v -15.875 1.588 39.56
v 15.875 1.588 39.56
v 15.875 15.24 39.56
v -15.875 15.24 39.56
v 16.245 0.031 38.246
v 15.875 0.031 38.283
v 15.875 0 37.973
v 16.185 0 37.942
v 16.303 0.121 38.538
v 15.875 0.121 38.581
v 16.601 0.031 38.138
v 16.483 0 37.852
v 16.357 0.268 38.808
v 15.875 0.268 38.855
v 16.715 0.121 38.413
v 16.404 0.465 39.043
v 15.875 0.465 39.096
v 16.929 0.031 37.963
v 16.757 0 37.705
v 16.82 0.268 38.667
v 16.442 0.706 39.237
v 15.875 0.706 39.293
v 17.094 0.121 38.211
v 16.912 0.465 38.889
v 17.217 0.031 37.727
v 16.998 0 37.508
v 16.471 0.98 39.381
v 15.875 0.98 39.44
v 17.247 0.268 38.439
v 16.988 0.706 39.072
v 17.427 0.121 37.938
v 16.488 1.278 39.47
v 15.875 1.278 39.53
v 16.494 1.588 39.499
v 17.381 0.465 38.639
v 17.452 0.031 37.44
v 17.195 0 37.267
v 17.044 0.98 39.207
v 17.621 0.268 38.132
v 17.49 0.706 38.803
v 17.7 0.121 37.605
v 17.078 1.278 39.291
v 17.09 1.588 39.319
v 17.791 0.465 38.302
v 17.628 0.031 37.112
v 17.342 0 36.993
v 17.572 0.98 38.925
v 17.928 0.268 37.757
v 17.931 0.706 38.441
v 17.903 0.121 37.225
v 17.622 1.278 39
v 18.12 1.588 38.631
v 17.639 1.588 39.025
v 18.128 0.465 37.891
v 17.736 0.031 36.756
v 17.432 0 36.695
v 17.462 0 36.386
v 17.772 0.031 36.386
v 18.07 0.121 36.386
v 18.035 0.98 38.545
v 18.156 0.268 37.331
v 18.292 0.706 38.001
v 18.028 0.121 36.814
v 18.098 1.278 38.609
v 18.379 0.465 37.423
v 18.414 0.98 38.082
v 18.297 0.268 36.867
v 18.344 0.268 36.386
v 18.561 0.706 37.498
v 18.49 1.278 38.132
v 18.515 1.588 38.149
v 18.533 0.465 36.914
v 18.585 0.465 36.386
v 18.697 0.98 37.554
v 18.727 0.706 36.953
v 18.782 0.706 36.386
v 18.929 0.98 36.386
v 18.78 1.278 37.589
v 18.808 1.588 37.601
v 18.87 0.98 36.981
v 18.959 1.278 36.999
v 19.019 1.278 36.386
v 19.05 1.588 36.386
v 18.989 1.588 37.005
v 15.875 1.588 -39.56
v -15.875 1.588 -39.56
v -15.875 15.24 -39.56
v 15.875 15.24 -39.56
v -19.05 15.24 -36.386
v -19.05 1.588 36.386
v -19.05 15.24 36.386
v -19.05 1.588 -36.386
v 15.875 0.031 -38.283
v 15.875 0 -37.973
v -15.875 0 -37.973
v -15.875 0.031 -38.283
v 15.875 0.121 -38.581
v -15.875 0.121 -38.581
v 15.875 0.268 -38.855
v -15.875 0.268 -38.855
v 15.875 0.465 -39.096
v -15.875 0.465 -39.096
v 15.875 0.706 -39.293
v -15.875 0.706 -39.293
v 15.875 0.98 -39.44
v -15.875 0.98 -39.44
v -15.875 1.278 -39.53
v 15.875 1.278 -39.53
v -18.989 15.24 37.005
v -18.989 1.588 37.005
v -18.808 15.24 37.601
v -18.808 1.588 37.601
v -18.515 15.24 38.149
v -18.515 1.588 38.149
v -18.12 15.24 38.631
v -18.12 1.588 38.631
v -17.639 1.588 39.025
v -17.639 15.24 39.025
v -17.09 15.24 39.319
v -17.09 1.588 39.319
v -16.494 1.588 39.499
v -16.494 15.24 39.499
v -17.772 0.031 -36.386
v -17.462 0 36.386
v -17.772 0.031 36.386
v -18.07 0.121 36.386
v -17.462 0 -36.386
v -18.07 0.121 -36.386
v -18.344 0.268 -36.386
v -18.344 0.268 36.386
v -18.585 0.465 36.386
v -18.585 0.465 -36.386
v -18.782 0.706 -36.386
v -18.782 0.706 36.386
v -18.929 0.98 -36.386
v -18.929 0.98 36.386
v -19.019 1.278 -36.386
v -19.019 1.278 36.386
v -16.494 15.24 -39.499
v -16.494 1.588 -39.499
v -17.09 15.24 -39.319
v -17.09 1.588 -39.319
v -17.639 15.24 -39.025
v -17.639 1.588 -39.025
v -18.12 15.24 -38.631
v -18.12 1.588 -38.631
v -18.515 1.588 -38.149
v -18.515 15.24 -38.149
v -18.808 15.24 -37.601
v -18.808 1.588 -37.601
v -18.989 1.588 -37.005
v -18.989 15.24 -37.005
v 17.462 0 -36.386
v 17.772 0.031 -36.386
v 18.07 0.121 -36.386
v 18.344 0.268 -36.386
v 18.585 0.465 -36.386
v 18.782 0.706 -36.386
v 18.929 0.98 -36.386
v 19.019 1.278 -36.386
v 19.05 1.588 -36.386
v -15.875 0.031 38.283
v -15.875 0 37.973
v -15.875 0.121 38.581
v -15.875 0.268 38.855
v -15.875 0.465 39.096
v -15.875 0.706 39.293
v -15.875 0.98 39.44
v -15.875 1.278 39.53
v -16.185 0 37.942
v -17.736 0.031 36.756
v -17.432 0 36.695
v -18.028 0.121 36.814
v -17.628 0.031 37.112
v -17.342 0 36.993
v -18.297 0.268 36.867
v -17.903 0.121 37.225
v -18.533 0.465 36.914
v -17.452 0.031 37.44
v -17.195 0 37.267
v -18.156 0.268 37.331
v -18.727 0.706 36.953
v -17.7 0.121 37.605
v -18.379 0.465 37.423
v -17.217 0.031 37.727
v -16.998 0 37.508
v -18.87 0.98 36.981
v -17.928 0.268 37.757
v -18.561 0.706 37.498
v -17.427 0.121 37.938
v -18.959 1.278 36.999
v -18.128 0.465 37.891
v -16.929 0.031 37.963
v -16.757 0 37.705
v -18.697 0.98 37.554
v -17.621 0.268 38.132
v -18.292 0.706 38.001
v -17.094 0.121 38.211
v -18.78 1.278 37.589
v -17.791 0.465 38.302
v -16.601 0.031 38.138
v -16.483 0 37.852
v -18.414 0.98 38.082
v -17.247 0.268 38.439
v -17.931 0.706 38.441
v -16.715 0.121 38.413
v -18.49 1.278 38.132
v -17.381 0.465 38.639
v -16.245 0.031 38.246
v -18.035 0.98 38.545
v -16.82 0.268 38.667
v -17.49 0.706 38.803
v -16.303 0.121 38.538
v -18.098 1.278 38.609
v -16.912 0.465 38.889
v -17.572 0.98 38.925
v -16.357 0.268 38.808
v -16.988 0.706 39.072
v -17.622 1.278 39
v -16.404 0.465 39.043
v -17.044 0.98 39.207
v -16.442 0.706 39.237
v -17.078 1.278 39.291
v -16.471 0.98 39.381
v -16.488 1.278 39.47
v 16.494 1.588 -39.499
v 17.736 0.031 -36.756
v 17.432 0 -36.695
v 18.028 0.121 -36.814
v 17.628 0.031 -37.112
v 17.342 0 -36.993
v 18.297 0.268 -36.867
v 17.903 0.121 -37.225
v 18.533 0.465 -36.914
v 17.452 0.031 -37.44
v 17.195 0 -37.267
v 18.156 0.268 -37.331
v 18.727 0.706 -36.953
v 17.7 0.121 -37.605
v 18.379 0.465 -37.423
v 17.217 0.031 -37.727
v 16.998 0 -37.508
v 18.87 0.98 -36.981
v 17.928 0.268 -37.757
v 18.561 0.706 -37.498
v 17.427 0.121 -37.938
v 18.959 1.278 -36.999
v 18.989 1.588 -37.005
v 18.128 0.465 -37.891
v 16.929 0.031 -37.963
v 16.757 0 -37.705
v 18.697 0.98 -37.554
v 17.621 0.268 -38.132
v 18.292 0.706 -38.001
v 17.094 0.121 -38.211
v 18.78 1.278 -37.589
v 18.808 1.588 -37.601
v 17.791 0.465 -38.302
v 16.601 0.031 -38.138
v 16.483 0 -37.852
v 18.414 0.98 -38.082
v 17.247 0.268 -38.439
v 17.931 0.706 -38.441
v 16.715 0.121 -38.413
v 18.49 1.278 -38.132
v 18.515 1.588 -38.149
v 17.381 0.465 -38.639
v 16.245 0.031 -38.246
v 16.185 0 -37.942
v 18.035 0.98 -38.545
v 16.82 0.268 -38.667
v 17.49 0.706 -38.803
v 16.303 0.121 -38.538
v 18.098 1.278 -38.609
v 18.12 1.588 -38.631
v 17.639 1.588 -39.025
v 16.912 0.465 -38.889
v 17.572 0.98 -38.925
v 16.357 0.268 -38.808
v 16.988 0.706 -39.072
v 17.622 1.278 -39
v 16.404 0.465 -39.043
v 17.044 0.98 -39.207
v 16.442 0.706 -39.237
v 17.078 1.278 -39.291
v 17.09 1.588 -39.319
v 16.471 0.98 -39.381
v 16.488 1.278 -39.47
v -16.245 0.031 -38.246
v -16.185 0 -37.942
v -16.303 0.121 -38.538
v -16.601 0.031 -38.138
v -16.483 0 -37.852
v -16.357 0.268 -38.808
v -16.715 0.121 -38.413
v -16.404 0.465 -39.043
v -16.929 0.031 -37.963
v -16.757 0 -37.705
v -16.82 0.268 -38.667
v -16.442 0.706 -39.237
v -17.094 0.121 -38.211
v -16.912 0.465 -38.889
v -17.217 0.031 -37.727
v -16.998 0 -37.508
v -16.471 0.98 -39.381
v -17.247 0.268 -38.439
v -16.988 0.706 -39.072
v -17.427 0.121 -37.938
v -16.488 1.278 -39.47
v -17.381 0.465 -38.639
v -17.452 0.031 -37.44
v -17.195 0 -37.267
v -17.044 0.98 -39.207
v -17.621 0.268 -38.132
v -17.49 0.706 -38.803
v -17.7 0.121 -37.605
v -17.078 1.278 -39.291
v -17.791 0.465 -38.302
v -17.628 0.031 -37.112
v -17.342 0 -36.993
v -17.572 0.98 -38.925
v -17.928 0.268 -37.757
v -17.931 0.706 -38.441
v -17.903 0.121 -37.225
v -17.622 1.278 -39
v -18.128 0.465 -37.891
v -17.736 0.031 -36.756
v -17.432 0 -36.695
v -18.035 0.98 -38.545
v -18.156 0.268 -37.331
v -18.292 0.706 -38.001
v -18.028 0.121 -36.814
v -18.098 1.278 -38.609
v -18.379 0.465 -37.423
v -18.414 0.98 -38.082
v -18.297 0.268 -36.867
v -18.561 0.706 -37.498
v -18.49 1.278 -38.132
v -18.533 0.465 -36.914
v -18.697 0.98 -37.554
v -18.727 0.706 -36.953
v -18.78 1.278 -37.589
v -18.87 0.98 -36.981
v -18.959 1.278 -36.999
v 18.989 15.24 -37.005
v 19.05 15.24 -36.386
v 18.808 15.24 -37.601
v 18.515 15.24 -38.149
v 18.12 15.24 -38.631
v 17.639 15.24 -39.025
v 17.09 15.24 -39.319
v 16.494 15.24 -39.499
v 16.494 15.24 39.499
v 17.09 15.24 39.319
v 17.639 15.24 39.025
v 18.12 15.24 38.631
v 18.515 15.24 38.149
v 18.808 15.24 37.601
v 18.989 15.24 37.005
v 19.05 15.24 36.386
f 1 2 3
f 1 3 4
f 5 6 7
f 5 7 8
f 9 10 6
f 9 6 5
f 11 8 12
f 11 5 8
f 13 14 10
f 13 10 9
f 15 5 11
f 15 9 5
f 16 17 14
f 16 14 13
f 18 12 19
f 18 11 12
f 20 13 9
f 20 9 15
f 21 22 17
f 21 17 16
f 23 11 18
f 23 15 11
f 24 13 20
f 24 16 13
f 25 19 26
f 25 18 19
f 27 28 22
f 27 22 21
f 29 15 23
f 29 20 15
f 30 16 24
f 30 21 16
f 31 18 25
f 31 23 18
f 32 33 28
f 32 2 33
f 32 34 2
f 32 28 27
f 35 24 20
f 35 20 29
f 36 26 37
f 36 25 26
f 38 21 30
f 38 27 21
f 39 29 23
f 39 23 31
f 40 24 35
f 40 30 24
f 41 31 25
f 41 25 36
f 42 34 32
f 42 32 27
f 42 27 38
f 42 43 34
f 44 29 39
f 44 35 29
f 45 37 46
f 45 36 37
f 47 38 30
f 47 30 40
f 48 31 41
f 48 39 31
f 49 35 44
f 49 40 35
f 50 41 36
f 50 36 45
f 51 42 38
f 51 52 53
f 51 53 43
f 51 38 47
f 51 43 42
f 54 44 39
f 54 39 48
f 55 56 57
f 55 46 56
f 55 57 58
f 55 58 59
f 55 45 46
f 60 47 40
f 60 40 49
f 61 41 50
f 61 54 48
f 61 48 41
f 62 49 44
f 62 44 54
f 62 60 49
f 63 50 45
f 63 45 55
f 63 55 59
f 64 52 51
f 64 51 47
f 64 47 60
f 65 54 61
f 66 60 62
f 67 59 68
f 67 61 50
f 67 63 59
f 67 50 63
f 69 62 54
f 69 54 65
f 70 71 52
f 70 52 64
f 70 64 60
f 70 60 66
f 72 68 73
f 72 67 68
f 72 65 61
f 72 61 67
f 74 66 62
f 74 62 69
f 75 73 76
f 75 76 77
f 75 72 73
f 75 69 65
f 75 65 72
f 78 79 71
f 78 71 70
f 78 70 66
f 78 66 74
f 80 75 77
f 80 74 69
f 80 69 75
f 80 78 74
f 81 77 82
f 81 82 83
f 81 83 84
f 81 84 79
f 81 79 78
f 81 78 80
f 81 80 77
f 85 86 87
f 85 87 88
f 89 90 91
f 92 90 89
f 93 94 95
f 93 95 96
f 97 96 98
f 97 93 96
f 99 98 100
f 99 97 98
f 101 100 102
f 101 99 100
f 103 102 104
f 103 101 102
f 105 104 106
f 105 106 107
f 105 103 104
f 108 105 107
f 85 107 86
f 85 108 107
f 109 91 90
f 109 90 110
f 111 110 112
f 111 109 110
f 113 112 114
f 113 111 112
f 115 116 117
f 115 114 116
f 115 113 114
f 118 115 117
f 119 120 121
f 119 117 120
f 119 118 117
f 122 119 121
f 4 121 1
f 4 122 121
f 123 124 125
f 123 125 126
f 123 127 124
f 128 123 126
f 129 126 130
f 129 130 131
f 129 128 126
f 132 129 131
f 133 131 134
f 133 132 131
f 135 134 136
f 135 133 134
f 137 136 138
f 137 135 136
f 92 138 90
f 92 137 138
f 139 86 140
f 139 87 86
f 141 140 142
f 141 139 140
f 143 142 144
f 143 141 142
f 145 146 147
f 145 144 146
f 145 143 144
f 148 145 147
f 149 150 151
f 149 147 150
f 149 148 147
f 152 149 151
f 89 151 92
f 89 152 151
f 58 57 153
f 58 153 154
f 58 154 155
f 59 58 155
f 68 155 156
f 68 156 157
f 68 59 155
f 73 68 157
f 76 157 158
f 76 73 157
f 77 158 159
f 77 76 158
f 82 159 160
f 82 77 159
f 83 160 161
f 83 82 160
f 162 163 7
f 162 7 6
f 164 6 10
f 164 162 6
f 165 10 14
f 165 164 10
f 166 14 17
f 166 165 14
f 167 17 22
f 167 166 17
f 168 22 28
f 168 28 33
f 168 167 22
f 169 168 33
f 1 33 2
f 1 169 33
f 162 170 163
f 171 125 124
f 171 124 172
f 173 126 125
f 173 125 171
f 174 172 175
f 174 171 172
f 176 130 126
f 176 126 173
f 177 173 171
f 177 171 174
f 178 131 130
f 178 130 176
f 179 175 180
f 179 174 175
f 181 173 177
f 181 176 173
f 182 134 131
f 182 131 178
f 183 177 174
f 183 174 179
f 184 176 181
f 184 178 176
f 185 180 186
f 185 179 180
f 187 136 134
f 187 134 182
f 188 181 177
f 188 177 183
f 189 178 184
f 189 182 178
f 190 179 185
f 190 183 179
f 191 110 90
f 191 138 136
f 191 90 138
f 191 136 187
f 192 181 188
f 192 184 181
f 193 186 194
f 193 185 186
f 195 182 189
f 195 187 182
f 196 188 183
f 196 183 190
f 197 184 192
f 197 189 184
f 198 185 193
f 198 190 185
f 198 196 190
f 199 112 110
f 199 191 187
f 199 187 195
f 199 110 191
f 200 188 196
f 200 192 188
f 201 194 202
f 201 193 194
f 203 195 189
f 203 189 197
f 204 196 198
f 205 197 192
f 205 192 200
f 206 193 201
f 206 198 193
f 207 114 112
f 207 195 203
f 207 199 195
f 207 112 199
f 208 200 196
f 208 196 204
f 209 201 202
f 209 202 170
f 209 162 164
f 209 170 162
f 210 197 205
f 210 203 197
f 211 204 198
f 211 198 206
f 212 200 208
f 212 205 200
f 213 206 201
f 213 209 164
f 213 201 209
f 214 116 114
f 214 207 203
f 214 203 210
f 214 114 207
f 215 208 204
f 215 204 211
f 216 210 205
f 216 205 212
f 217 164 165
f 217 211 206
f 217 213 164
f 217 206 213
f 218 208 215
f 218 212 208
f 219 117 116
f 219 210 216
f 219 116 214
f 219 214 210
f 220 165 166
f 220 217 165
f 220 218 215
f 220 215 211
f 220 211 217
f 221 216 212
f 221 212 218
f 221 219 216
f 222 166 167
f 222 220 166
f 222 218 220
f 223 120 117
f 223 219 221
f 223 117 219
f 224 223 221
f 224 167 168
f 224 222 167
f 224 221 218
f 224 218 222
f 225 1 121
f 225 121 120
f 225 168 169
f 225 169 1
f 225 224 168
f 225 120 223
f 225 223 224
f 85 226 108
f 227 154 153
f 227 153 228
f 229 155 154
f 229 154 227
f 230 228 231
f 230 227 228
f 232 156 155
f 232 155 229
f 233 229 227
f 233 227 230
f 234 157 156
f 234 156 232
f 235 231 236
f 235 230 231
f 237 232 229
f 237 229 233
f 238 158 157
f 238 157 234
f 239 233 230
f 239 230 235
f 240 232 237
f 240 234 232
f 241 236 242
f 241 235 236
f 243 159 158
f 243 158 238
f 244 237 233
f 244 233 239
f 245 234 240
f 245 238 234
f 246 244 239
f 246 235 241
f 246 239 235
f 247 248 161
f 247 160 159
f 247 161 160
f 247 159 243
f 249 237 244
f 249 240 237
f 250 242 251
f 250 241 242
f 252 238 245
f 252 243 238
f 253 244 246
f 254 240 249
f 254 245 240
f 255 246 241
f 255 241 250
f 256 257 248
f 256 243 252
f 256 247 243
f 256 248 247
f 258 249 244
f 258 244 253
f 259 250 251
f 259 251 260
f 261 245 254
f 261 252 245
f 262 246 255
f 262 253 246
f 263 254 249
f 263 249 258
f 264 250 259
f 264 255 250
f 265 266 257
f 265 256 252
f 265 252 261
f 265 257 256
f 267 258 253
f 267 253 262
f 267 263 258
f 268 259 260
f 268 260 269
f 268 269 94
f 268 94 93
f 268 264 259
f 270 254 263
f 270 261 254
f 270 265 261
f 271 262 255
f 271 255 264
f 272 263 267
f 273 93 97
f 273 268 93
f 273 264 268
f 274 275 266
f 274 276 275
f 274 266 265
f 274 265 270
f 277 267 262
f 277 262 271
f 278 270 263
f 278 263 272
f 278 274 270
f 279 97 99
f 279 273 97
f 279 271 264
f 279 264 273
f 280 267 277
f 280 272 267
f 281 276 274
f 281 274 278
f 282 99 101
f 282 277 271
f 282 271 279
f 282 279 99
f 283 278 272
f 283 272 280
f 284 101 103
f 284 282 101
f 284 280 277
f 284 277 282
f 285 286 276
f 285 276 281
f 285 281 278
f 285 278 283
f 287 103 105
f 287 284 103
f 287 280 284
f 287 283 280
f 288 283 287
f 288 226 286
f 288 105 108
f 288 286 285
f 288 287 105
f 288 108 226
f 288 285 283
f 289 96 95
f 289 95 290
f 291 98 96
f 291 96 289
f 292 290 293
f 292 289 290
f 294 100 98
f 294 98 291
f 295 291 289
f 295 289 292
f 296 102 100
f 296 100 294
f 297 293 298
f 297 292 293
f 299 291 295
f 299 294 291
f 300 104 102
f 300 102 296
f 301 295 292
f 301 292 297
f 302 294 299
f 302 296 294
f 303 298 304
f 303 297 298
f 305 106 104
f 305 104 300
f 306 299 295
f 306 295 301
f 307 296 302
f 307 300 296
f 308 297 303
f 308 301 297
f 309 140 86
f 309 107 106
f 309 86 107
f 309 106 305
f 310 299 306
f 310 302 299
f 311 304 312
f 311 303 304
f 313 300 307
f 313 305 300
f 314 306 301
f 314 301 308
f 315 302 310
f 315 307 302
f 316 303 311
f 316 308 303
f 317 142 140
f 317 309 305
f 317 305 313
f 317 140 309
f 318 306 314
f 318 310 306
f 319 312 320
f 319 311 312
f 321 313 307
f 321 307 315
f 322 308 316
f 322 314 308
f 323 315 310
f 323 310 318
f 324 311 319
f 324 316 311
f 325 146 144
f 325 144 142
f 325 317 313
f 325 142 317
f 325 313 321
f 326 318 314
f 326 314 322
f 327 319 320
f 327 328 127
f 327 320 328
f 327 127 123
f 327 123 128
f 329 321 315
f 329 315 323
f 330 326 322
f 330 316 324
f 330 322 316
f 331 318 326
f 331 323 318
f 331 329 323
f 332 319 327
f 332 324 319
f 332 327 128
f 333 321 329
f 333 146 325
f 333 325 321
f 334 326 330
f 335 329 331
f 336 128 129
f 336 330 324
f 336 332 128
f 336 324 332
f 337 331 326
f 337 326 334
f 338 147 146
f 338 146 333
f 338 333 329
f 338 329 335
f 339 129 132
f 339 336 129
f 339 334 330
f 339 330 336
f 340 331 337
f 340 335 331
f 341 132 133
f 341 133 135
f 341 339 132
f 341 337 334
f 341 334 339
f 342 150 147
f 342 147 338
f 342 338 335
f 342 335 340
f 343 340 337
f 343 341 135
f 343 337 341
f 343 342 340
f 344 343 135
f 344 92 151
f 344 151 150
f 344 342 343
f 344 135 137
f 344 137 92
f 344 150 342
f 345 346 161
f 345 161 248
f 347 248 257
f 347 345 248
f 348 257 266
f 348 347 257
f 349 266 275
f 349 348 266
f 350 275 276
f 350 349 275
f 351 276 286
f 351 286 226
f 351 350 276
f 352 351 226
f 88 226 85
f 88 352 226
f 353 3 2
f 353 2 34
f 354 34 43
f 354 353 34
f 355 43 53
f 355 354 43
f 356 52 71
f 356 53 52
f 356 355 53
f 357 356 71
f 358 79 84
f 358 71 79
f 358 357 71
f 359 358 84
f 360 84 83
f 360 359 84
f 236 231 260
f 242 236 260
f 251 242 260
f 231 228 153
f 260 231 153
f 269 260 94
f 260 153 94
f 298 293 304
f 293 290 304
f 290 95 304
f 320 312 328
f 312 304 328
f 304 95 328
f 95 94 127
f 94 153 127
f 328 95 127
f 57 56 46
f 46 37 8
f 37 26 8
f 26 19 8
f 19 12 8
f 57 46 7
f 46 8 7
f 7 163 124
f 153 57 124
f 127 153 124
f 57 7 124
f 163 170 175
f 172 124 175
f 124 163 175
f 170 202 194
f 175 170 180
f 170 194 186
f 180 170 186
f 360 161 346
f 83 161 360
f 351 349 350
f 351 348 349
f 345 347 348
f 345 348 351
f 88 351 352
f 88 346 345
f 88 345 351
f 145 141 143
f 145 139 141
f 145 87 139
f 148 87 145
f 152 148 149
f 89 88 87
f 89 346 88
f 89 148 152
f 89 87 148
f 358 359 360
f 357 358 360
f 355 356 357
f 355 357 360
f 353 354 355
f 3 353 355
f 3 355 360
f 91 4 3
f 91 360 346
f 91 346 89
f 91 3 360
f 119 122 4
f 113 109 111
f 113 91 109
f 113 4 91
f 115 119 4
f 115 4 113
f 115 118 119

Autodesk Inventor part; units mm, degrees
ref_plane "YZ Plane" through (0, 0, 0) normal (1, 0, 0) x (0, 1, 0)
ref_plane "XZ Plane" through (0, 0, 0) normal (0, 1, 0) x (-1, 0, 0)
ref_plane "XY Plane" through (0, 0, 0) normal (0, 0, 1) x (1, 0, 0)
sketch "Sketch1" plane through (0, 0, 0) normal (0, 1, 0) x (-1, 0, 0)
  line L0 (-19.05, 39.5605) -> (19.05, 39.5605)
  line L1 (19.05, 39.5605) -> (19.05, -39.5605)
  line L2 (19.05, -39.5605) -> (-19.05, -39.5605)
  line L3 (-19.05, -39.5605) -> (-19.05, 39.5605)
  line L4 (-19.05, 39.5605) -> (19.05, -39.5605) construction
  line L5 (19.05, 39.5605) -> (-19.05, -39.5605) construction
  point P0 (0, 0)
  dimension "d0" = 79.121
  dimension "d1" = 38.1
extrude "Extrusion1" add sketch "Sketch1" along normal blind 15.24
fillet "Fillet1" radius 1.5875 4 edges at (19.05, 0, 0) (0, 0, 39.5605) (-19.05, 0, 0) (0, 0, -39.5605)
fillet "Fillet1" radius 3.175 4 edges at (-19.05, 7.62, -39.5605) (19.05, 7.62, -39.5605) (19.05, 7.62, 39.5605) (-19.05, 7.62, 39.5605)
properties part number "rasberry pi"
